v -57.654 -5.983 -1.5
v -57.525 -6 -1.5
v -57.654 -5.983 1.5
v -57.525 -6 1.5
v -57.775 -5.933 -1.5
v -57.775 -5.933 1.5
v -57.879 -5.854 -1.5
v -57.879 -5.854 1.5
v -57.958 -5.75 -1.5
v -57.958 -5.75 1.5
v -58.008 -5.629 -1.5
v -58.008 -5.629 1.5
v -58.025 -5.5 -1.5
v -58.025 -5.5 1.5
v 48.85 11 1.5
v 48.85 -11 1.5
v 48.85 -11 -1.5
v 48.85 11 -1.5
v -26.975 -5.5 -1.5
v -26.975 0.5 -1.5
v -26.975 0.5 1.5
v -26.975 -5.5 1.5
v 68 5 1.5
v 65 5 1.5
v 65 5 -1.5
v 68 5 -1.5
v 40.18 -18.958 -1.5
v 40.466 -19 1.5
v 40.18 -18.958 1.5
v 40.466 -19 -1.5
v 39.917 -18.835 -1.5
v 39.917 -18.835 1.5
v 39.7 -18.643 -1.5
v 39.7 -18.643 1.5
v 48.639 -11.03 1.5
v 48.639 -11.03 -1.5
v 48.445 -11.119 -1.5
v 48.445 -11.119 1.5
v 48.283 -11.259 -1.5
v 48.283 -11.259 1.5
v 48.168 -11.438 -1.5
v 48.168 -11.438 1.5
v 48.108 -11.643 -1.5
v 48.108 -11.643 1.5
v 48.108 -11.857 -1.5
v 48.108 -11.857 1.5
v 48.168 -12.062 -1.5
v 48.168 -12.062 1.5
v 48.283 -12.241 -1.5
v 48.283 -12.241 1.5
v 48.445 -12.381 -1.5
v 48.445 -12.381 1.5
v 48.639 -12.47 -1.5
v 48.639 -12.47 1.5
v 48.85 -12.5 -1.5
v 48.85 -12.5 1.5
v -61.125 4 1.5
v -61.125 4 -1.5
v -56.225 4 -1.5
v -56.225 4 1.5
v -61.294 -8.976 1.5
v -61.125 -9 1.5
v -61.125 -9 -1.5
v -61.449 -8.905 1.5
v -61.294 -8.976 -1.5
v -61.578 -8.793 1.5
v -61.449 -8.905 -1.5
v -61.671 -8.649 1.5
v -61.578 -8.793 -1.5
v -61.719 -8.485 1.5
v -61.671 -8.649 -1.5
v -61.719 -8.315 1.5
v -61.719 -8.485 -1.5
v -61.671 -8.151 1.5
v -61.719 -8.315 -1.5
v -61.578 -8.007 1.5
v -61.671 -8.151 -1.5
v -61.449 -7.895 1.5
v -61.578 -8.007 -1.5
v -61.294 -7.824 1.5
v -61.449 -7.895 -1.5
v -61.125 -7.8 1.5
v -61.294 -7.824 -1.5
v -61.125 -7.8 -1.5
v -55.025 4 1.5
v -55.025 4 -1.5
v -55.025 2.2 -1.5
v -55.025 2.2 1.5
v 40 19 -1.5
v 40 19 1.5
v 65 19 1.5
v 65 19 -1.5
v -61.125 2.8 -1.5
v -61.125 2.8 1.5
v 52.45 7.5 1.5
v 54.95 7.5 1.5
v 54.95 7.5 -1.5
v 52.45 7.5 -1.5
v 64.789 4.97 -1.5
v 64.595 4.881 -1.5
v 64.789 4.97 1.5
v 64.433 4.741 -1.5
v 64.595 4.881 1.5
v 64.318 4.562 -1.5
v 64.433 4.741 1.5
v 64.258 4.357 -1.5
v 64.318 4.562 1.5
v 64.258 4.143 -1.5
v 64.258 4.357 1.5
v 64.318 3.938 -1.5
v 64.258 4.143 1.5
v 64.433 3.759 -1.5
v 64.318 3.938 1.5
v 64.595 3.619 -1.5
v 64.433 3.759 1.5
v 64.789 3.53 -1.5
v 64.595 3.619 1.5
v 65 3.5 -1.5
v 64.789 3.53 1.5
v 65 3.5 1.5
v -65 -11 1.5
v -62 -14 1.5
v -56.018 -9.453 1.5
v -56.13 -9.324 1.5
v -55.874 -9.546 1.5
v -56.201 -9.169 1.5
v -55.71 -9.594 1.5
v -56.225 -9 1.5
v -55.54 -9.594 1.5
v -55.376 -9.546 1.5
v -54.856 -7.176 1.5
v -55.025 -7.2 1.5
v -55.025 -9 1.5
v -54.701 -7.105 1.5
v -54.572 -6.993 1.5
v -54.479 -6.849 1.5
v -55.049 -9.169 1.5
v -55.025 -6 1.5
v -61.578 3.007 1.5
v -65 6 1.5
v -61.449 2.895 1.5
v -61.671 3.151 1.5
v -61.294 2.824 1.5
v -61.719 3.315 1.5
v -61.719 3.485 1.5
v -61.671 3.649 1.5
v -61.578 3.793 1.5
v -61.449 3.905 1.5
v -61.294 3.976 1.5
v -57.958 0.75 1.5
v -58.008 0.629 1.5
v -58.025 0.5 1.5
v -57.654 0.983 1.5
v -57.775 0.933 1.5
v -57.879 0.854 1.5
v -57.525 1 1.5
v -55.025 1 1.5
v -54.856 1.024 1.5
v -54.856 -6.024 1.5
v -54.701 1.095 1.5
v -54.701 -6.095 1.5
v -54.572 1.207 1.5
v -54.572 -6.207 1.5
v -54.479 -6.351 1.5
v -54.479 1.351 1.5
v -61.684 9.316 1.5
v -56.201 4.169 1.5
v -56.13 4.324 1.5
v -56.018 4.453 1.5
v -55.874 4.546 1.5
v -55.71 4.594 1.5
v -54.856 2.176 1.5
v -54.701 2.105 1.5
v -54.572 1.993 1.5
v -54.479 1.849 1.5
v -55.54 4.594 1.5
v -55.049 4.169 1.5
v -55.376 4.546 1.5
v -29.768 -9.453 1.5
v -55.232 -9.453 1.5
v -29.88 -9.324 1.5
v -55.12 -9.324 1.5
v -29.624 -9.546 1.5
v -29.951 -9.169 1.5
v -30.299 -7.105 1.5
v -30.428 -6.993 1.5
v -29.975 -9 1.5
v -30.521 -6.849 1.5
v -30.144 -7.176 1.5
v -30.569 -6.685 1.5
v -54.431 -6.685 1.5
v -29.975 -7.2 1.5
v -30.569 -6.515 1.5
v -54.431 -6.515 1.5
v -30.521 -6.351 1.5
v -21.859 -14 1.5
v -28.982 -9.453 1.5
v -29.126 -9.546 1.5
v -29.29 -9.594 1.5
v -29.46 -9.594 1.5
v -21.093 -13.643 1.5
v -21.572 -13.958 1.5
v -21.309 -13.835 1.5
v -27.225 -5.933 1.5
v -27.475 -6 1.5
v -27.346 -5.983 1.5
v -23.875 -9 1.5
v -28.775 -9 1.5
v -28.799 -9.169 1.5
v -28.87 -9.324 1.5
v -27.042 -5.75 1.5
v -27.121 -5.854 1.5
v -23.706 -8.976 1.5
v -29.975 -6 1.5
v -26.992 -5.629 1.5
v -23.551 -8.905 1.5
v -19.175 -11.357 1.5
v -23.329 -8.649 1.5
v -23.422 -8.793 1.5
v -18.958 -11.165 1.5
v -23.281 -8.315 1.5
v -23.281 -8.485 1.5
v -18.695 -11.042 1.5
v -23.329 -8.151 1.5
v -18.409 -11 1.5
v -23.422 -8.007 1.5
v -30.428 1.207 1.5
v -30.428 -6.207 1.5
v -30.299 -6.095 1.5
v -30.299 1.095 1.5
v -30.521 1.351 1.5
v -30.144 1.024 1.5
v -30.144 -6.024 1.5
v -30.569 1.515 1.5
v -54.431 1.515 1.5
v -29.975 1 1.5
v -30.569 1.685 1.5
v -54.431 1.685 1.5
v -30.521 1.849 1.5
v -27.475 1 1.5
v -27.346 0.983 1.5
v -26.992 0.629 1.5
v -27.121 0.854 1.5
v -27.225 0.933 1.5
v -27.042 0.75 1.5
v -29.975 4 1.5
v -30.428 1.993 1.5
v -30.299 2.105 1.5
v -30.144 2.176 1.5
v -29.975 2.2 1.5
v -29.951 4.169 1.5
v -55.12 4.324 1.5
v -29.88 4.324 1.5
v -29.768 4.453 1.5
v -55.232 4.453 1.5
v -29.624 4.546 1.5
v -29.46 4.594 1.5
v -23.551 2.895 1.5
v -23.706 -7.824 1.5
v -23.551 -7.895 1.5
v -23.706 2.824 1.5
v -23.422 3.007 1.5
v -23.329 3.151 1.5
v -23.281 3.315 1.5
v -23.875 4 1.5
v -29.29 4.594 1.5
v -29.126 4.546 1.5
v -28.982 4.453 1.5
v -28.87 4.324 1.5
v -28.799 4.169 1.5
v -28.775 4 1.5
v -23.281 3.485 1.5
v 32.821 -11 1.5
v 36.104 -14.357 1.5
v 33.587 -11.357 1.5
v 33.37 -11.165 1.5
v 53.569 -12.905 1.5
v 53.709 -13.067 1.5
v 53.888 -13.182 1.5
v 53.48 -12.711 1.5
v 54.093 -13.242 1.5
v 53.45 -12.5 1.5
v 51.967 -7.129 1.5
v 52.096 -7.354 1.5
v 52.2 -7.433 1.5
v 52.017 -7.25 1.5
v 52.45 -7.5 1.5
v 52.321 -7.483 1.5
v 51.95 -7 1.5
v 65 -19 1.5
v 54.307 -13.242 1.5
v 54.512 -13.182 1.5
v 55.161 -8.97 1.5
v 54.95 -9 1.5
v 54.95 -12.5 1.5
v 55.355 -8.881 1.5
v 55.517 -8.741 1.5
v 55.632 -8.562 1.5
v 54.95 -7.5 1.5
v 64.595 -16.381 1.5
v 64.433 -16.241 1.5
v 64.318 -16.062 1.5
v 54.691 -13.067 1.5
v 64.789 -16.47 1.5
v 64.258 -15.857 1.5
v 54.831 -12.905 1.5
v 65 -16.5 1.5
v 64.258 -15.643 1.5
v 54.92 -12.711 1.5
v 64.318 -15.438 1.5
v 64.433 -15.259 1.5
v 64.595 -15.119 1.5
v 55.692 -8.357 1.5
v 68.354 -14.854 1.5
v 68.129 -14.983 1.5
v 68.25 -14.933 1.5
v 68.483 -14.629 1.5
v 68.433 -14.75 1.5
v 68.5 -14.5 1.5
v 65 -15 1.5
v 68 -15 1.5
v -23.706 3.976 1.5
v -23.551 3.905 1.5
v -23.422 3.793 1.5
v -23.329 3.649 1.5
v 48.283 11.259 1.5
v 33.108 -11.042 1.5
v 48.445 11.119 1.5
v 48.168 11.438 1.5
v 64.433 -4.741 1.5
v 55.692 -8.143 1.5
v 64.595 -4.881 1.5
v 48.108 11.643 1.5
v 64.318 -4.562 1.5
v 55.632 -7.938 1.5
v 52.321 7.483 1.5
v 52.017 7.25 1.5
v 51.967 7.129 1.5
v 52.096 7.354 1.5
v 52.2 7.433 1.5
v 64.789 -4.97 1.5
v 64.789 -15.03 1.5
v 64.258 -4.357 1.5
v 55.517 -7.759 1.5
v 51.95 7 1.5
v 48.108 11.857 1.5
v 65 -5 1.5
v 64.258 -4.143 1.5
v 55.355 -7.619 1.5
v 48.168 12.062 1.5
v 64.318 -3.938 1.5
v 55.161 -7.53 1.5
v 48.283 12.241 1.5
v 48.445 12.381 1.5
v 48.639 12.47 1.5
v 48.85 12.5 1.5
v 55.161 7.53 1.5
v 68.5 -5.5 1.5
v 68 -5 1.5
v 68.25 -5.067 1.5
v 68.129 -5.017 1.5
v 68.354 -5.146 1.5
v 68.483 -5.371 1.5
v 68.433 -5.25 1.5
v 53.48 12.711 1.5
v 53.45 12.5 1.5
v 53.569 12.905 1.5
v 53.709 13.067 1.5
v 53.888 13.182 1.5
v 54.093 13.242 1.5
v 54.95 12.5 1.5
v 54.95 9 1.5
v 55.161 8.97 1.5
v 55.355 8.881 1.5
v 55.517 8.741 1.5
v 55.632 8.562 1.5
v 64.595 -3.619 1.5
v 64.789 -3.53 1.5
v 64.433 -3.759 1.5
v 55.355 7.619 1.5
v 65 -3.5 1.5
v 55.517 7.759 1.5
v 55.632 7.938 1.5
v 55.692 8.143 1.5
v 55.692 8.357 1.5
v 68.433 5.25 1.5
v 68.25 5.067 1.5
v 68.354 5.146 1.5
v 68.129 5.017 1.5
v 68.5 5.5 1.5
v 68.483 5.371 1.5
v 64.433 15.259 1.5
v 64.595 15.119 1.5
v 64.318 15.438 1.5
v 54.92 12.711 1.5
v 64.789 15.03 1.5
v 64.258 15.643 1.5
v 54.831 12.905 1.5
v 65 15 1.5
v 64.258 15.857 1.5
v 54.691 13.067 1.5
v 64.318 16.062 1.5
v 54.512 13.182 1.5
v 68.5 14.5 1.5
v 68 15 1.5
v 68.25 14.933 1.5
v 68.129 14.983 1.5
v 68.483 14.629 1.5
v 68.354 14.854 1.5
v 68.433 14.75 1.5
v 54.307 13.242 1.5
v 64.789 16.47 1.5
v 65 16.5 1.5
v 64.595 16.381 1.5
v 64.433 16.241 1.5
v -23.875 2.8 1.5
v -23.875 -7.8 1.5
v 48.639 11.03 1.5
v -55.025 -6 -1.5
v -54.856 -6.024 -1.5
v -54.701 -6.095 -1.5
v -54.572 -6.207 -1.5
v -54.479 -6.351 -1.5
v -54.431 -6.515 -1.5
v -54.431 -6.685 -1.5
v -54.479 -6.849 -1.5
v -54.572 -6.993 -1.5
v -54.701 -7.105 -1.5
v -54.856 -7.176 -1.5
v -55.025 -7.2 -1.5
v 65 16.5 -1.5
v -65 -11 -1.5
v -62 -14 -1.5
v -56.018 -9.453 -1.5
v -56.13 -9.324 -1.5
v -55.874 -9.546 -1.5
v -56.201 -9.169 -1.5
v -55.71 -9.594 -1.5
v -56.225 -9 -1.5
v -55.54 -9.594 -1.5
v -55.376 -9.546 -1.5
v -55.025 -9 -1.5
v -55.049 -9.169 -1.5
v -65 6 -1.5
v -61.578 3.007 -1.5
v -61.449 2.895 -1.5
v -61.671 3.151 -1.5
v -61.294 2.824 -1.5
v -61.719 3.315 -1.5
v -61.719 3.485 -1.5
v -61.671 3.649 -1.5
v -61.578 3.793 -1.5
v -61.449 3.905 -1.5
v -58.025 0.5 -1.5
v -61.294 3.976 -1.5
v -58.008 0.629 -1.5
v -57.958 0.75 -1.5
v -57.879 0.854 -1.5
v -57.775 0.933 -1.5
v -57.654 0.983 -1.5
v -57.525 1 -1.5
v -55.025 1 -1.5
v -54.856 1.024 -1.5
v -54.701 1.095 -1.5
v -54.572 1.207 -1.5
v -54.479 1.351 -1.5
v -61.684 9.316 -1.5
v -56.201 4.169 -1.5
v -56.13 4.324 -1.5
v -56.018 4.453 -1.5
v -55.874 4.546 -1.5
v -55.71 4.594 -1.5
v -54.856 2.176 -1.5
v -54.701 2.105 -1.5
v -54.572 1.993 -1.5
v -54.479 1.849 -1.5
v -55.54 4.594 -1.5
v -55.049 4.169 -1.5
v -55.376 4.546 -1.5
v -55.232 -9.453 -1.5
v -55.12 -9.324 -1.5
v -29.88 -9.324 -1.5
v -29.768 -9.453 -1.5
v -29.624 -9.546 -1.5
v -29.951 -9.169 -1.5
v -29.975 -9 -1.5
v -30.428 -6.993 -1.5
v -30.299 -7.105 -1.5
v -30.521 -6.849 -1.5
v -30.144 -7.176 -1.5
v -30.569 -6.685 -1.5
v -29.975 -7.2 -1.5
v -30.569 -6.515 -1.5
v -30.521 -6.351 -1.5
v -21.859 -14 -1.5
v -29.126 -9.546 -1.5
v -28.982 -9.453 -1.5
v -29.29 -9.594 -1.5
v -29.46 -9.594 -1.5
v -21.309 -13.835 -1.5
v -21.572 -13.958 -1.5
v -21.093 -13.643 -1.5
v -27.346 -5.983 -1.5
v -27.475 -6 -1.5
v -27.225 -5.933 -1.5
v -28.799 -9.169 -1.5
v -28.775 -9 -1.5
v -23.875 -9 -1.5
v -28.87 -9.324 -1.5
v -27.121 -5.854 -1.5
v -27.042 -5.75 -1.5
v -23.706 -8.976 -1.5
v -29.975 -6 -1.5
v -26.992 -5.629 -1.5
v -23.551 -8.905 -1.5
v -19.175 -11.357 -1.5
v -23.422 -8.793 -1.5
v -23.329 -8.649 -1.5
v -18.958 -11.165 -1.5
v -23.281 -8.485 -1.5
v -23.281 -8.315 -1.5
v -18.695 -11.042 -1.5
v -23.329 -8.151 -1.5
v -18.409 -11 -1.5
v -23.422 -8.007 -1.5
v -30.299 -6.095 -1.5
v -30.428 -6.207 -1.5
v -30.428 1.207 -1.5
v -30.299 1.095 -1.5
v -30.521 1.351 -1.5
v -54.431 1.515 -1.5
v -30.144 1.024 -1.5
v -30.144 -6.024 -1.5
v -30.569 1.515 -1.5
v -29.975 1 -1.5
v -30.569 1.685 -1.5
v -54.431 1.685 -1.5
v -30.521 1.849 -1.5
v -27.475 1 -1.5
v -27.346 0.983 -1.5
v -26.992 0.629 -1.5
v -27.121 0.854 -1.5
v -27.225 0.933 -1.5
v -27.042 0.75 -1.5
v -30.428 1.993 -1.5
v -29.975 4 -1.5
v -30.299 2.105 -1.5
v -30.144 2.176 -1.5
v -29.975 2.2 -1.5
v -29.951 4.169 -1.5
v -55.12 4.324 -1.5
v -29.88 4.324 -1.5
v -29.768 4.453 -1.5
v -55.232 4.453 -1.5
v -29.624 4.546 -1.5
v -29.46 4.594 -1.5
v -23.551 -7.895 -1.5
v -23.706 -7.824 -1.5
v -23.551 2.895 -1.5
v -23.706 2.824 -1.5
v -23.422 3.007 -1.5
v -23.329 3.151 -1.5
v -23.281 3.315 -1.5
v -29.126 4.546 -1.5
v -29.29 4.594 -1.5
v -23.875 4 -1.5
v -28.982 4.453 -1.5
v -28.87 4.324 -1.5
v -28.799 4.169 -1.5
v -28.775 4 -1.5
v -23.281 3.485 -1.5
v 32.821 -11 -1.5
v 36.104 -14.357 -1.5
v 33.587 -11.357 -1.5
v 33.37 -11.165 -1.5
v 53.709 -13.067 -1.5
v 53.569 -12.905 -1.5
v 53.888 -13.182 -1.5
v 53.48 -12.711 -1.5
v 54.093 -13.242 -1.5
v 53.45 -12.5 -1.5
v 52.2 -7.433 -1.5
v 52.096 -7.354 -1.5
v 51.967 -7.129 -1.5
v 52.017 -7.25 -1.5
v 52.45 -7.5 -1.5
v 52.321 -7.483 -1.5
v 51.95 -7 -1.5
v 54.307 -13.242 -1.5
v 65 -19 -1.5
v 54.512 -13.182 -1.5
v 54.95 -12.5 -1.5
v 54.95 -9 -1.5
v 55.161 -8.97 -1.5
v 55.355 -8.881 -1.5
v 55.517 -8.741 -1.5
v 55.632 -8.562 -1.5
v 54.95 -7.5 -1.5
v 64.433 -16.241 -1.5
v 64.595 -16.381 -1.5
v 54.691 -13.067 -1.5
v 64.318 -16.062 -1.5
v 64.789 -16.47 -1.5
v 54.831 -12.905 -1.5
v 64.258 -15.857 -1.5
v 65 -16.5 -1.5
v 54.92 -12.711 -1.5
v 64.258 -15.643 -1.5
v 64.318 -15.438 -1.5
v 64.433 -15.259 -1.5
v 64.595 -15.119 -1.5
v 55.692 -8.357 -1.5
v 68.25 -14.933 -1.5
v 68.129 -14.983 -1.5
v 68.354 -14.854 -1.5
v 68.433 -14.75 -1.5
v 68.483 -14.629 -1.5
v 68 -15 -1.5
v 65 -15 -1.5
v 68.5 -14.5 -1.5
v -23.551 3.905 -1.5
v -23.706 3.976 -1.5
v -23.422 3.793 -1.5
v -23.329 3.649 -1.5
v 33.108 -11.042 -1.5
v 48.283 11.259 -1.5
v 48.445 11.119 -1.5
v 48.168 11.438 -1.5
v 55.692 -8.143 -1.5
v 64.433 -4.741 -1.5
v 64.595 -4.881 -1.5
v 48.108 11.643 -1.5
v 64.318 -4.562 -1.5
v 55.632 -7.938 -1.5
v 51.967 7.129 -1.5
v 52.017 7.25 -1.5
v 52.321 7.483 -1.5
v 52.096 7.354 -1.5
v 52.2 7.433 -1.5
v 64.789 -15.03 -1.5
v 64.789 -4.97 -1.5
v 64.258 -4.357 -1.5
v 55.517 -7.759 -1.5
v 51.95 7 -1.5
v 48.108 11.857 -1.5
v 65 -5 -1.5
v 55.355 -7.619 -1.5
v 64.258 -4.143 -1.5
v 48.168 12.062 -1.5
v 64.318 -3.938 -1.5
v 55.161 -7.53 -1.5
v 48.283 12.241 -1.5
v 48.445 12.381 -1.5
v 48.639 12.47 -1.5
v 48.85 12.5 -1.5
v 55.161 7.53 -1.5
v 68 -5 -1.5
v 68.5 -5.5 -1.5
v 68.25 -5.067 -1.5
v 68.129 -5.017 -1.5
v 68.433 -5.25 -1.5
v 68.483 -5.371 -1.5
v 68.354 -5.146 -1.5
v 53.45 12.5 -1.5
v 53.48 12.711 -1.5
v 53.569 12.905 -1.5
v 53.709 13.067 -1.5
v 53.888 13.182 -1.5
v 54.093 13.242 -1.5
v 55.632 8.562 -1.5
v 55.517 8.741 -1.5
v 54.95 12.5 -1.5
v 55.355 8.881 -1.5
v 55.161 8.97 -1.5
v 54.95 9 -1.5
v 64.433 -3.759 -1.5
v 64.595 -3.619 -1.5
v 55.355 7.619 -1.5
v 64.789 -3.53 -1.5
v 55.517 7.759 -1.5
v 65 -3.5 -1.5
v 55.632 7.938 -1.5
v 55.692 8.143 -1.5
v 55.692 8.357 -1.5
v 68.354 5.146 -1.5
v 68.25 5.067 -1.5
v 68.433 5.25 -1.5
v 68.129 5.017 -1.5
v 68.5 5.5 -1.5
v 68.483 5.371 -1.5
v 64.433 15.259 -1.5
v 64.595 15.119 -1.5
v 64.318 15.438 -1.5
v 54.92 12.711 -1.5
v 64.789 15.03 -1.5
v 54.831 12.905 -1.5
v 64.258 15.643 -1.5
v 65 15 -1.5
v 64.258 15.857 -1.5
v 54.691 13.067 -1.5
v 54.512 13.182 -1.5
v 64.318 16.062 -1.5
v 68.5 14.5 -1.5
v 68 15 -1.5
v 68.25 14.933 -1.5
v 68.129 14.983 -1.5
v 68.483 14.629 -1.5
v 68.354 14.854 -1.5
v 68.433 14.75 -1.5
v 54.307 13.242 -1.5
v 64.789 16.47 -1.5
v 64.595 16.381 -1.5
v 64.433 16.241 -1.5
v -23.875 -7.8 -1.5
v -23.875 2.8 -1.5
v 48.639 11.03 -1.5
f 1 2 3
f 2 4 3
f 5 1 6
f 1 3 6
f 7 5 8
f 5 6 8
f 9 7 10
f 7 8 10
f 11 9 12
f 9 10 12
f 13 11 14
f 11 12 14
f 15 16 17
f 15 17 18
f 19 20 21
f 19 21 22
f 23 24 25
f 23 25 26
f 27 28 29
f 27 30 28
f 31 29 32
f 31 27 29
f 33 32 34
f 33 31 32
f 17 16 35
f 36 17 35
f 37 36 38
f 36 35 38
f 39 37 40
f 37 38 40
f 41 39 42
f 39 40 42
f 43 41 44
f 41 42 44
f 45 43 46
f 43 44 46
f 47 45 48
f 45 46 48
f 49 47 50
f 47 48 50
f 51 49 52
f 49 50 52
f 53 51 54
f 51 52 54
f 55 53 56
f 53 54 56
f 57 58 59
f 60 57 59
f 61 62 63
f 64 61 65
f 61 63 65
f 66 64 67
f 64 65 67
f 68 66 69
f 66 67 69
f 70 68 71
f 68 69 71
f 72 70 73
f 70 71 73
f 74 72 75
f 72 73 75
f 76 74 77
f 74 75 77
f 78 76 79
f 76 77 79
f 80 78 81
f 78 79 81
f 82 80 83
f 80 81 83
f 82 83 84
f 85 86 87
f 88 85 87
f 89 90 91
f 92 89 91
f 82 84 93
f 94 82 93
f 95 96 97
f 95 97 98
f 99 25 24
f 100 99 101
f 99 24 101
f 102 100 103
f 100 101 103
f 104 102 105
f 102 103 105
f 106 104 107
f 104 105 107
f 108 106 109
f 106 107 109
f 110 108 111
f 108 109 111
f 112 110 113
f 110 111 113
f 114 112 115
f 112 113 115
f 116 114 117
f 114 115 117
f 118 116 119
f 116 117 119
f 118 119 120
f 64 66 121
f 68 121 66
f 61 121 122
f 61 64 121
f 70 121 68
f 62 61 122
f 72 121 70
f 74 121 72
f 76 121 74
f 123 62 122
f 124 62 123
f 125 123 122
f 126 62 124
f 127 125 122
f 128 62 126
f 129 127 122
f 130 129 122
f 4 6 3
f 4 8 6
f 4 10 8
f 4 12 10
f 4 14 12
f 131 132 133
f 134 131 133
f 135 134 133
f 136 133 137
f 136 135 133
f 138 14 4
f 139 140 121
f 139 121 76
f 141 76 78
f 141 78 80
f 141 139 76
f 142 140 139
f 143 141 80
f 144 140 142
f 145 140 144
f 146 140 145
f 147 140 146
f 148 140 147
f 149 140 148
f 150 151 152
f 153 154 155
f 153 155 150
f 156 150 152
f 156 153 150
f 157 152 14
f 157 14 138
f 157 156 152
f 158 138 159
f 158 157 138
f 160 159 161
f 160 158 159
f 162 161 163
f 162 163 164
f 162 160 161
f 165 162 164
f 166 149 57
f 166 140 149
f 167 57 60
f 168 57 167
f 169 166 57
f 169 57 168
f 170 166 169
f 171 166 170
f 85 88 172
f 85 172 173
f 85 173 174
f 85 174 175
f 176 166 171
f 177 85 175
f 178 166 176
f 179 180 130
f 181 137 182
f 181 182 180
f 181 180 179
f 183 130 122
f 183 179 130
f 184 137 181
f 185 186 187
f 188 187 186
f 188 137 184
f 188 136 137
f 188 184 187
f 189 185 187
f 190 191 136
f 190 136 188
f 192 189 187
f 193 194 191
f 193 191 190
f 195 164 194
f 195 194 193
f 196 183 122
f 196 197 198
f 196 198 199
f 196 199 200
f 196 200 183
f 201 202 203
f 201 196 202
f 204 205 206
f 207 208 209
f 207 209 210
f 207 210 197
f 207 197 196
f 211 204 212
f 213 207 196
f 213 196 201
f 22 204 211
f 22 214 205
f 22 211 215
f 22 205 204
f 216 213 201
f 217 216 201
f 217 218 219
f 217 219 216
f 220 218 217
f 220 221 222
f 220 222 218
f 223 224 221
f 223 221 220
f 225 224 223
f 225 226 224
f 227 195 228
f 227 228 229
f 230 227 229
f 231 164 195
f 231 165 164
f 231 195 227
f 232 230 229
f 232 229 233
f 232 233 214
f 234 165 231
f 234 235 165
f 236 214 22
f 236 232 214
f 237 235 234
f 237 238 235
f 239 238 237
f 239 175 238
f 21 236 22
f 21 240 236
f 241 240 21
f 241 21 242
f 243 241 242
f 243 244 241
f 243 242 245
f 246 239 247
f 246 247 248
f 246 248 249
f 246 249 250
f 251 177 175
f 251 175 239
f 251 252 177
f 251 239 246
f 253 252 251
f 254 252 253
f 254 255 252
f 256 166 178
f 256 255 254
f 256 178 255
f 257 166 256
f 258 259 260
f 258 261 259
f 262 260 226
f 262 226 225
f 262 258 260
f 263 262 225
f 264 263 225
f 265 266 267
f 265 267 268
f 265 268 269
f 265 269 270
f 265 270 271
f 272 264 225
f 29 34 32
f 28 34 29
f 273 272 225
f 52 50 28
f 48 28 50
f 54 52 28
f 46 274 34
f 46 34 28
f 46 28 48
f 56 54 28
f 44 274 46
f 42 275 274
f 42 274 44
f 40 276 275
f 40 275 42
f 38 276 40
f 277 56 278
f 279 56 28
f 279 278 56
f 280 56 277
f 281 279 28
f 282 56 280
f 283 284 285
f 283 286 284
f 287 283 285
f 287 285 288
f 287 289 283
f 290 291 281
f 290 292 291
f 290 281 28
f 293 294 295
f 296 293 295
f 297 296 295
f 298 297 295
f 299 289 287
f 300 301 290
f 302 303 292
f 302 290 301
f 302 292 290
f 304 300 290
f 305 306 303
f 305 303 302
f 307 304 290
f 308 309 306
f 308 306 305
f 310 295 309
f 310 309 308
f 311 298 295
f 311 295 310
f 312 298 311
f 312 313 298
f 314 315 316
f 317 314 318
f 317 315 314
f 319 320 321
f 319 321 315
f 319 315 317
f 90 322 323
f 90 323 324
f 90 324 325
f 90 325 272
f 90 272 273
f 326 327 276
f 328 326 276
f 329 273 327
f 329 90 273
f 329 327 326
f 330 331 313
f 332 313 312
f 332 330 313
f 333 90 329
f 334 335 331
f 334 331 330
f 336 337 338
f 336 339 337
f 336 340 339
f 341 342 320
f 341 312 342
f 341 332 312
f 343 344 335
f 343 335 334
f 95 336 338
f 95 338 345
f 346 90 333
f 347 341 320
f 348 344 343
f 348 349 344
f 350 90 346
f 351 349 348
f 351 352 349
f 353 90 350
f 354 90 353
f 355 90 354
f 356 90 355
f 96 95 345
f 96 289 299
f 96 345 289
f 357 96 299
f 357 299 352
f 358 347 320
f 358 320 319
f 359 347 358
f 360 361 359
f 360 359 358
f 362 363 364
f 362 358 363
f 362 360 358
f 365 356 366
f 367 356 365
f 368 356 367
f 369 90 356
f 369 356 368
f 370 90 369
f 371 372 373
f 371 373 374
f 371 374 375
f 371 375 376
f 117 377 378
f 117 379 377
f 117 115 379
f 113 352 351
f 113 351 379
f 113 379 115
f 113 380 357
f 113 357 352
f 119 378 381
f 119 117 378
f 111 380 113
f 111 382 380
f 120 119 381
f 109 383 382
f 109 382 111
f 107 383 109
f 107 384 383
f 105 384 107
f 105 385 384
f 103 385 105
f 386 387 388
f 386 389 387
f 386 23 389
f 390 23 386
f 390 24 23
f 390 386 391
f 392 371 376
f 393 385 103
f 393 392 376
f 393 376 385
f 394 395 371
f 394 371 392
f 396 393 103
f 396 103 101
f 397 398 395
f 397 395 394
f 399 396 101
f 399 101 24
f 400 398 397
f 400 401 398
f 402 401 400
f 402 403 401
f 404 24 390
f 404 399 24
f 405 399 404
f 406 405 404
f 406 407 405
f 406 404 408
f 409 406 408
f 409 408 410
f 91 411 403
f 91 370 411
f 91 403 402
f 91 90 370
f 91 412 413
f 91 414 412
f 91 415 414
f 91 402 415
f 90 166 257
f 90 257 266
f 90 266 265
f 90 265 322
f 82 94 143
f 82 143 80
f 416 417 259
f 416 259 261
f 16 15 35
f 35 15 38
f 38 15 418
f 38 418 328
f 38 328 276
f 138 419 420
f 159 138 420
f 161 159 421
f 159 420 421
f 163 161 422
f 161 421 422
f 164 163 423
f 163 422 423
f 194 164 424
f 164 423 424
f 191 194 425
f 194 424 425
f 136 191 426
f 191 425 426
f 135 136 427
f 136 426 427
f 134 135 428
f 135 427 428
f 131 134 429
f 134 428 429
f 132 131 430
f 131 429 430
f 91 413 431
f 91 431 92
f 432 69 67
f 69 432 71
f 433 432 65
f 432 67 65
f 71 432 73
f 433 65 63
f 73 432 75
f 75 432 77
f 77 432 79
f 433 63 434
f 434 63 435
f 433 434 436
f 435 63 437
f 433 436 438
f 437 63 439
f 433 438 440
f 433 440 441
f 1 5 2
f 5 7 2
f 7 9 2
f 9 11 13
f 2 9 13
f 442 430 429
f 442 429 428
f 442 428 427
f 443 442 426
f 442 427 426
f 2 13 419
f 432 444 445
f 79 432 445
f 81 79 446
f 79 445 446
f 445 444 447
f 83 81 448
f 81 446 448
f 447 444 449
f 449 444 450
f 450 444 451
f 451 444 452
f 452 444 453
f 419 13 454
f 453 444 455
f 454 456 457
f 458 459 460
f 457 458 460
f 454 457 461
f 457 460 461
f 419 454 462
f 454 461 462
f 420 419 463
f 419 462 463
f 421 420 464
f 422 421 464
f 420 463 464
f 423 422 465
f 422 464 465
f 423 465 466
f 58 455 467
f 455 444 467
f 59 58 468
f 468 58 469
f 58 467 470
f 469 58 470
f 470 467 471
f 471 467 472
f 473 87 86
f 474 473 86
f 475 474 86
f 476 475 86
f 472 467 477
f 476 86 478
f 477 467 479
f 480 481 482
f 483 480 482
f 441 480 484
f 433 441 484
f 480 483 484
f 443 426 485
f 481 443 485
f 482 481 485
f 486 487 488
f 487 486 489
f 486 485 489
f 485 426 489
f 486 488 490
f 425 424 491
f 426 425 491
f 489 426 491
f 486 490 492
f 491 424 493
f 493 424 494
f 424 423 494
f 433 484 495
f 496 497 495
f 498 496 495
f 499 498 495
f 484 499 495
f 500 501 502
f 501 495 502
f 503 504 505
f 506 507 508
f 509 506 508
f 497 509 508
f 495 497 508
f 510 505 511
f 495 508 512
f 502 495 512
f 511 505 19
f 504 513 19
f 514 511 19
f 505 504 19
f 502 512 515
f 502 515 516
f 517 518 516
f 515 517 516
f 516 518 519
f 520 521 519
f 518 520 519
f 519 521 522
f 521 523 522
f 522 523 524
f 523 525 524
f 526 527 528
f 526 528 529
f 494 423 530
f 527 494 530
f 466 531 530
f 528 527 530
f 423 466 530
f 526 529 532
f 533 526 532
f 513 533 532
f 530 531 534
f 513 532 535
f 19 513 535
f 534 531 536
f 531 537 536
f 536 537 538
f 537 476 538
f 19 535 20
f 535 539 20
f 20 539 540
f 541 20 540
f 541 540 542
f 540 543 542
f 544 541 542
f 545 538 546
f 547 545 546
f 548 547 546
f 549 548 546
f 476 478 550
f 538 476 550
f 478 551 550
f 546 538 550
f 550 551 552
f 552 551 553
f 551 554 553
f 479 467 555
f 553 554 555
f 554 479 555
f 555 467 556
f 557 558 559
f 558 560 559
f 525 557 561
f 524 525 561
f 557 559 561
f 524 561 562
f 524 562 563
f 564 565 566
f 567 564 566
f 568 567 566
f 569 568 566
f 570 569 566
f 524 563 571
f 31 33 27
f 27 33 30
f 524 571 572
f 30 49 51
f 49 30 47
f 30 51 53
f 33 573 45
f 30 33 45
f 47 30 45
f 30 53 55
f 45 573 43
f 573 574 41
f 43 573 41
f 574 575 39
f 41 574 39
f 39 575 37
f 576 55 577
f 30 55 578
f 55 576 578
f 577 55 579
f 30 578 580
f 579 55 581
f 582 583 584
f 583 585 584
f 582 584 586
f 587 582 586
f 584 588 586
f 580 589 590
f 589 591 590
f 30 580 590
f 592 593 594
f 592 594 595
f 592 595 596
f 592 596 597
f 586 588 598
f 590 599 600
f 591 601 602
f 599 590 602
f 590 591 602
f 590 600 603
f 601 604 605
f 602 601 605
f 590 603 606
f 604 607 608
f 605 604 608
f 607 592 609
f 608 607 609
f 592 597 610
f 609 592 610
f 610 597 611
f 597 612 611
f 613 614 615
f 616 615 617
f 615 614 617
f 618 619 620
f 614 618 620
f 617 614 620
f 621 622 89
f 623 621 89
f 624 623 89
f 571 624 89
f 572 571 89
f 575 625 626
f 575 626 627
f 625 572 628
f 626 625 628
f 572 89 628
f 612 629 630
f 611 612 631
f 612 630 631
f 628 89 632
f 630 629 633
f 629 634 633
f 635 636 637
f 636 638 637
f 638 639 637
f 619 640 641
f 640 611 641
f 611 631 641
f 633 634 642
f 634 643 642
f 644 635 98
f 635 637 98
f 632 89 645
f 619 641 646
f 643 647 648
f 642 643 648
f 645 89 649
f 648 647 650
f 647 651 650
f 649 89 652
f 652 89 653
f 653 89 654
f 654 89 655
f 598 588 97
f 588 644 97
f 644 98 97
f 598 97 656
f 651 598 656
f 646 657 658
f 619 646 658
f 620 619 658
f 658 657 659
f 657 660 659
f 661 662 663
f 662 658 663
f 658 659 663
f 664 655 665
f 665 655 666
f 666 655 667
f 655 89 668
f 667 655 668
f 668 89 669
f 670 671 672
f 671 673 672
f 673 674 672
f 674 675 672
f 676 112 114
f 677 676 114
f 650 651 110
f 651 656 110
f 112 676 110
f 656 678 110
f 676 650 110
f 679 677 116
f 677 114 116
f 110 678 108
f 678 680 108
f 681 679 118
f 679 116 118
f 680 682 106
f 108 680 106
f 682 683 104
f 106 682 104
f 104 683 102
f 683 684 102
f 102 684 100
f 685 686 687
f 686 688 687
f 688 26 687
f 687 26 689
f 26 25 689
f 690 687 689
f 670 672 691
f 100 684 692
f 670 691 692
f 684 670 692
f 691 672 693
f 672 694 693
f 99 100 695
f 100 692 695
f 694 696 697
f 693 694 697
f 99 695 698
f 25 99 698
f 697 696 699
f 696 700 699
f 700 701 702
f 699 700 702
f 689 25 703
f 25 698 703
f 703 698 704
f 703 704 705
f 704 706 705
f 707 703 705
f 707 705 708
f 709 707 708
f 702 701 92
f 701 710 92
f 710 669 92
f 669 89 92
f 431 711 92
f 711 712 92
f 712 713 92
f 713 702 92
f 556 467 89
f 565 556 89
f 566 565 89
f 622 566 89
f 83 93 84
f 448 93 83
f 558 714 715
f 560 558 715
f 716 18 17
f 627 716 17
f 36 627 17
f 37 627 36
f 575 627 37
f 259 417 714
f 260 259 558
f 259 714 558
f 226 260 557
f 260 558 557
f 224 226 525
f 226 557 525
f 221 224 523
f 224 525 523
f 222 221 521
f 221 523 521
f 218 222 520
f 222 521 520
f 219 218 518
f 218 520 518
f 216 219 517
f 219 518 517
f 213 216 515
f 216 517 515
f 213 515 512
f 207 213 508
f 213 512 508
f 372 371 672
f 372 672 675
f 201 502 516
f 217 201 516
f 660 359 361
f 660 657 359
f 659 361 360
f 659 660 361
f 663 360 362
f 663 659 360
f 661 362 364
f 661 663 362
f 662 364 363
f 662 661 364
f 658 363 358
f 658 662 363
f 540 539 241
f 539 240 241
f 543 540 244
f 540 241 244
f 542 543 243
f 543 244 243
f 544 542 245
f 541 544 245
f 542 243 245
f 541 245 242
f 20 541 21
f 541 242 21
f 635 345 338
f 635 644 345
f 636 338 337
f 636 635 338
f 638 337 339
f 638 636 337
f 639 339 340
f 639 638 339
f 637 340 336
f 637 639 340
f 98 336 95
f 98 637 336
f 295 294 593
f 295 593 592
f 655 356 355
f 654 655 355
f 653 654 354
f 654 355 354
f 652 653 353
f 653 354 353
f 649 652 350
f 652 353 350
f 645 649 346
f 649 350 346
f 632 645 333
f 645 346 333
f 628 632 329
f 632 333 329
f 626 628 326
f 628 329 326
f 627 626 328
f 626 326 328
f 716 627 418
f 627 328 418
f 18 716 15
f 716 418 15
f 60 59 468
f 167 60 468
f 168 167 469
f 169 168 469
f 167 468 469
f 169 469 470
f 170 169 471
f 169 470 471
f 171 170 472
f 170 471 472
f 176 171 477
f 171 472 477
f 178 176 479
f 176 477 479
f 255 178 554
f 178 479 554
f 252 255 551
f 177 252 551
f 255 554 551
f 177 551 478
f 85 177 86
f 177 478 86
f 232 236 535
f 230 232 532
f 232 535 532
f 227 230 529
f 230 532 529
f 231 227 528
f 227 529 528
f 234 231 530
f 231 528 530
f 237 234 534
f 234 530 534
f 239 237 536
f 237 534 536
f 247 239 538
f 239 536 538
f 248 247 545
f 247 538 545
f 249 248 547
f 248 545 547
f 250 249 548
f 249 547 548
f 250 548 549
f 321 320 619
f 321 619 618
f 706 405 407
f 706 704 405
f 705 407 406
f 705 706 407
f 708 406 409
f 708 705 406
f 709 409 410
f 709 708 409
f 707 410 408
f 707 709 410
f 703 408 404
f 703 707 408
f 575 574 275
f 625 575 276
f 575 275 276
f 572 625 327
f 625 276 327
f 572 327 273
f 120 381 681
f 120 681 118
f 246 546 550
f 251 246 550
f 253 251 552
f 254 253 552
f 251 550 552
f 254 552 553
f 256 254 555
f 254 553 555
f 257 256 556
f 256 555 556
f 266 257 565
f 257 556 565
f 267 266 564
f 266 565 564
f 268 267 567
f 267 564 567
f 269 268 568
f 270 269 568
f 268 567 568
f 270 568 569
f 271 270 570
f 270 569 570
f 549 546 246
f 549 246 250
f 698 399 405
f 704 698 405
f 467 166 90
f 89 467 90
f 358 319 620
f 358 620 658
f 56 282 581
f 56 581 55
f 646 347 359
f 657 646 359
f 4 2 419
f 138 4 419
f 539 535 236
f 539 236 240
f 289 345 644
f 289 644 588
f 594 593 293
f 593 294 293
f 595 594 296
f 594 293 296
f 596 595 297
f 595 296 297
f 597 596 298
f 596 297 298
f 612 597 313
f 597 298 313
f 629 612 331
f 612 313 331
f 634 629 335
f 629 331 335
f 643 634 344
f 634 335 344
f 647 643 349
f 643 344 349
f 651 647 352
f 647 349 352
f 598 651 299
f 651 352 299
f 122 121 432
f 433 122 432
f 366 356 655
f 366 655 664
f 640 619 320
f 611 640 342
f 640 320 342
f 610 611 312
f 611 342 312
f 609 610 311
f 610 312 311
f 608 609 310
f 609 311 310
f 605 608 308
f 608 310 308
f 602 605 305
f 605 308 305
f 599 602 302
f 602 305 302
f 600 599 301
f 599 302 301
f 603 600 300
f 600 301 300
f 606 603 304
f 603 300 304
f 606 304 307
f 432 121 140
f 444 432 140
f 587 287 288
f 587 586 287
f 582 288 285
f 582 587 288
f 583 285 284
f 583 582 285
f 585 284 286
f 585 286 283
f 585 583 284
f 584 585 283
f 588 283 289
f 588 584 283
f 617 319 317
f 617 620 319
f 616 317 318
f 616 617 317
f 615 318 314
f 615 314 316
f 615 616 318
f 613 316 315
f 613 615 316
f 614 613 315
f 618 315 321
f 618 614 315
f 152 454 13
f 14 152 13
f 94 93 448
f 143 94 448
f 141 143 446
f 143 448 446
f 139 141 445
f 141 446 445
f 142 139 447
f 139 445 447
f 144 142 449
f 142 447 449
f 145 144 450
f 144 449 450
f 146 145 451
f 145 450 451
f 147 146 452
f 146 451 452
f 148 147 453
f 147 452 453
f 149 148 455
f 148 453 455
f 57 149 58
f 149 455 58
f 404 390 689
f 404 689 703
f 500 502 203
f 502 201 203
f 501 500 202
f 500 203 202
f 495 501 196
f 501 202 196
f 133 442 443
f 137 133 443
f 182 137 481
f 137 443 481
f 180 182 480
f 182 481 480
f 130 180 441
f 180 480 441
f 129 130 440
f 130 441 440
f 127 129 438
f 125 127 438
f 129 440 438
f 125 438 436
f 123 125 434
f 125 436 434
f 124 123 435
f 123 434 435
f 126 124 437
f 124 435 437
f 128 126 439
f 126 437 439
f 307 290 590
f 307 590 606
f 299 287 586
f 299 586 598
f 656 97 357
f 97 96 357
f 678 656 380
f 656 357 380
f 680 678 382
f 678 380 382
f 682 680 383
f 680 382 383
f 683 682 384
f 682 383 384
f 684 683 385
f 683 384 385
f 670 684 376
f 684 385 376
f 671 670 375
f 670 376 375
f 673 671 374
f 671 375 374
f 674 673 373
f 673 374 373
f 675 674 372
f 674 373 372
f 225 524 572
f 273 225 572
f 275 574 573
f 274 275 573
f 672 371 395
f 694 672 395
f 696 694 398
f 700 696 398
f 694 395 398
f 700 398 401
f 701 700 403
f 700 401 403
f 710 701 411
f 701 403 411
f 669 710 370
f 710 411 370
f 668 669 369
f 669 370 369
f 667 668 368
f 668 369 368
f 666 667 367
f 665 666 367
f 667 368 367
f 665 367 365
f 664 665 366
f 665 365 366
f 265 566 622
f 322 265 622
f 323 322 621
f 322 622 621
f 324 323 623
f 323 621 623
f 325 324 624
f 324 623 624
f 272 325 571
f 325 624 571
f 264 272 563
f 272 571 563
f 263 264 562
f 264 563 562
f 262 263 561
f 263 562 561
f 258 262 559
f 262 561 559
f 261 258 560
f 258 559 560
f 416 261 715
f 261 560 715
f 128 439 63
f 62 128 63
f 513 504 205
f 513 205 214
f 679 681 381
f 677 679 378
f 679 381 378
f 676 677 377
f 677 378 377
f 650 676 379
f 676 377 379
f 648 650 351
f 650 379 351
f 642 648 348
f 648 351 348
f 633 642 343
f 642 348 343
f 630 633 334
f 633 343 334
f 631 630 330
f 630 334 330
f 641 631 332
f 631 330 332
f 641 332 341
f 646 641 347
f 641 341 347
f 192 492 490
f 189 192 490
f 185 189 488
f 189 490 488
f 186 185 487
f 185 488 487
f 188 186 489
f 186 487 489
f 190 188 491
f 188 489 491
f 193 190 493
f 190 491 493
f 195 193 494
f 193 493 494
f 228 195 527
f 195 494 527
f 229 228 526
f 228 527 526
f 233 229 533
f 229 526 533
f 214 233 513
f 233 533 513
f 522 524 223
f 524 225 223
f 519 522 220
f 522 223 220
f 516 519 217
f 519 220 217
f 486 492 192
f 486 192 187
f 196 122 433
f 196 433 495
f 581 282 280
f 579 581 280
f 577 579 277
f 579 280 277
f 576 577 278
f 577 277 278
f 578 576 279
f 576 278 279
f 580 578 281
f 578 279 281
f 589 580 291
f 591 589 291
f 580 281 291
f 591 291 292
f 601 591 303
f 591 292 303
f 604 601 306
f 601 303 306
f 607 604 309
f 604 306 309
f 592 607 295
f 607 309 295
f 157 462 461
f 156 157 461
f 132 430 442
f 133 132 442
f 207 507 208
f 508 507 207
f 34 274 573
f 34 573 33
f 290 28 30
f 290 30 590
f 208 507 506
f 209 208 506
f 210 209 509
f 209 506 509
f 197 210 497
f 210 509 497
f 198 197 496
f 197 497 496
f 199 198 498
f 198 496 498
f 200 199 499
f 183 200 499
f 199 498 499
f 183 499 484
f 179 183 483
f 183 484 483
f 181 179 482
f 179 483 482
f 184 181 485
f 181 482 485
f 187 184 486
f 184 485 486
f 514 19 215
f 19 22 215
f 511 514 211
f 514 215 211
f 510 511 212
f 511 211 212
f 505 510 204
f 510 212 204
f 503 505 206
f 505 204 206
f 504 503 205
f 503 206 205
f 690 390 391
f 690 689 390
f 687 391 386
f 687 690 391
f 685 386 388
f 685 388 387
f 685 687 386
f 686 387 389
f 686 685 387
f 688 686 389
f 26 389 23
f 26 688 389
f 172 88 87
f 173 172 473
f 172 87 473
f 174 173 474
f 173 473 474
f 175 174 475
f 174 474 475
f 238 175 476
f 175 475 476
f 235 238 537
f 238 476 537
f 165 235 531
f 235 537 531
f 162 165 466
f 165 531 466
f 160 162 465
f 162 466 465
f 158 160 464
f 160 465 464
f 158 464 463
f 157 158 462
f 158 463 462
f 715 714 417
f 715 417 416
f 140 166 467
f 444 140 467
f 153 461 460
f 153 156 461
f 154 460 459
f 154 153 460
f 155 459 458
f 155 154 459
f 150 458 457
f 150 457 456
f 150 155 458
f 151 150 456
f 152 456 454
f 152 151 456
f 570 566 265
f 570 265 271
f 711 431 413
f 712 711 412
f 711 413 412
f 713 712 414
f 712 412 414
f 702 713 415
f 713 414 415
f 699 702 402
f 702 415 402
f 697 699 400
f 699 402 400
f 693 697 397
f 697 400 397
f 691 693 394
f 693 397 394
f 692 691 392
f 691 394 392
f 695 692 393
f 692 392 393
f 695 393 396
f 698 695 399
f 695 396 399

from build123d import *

# Parameters (mm, degrees)
SKETCH_1_W             = 130
SKETCH_1_H             = 38
EXTRUDE_1_DEPTH        = 1.5
SKETCH_2_W             = 3.5
SKETCH_2_H             = 10
EXTRUDE_2_DEPTH        = 3
CUT_EXTRUDE_2_DEPTH    = 4
SKETCH_3_R             = 0.75
CUT_EXTRUDE_1_DEPTH    = 4
FILLET_1_R             = 0.5
CUT_EXTRUDE_3_DEPTH    = 4
FILLET_2_R             = 1
CUT_EXTRUDE_4_DEPTH    = 4
CUT_EXTRUDE_6_DEPTH    = 4
SKETCH_9_R             = 0.6
CUT_EXTRUDE_7_DEPTH    = 4
FILLET_3_R             = 0.5
CUT_EXTRUDE_8_DEPTH    = 4
FILLET_4_R             = 1
CHAMFER_1_SIZE         = 3
CHAMFER_1_EDGE_2_SIZE2 = 3.330793123
CHAMFER_1_EDGE_2_SIZE  = 3


with BuildPart() as part:
    # 草图1 → 凸台-拉伸1 (new body, symmetric)
    with BuildSketch(Plane.XY):
        Rectangle(SKETCH_1_W, SKETCH_1_H)
    extrude(amount=EXTRUDE_1_DEPTH, both=True)

    # 草图2 → 凸台-拉伸2 (add)
    with BuildSketch(Plane.XY.offset(1.5)):
        with Locations((66.75, 10)):
            Rectangle(SKETCH_2_W, SKETCH_2_H)
        with Locations((66.75, -10)):
            Rectangle(SKETCH_2_W, SKETCH_2_H)
    extrude(amount=-EXTRUDE_2_DEPTH)

    # 草图4 → 切除-拉伸2 (cut, through all)
    with BuildSketch(Plane.XY.offset(1.5)):
        Polygon((48.85, 12.5), (54.95, 12.5), (54.95, 7.5), (51.95, 7.5), (51.95, -7.5), (54.95, -7.5), (54.95, -12.5), (48.85, -12.5), align=None)
    extrude(amount=-CUT_EXTRUDE_2_DEPTH, mode=Mode.SUBTRACT)

    # 草图3 → 切除-拉伸1 (cut, through all)
    with BuildSketch(Plane.XY.offset(1.5)):
        with Locations((65, 15.75)):
            Circle(SKETCH_3_R)
        with Locations((65, 4.25)):
            Circle(SKETCH_3_R)
        with Locations((65, -4.25)):
            Circle(SKETCH_3_R)
        with Locations((65, -15.75)):
            Circle(SKETCH_3_R)
        with Locations((54.95, 8.25)):
            Circle(SKETCH_3_R)
        with Locations((54.2, 12.5)):
            Circle(SKETCH_3_R)
        with Locations((48.85, 11.75)):
            Circle(SKETCH_3_R)
        with Locations((48.85, -11.75)):
            Circle(SKETCH_3_R)
        with Locations((54.95, -8.25)):
            Circle(SKETCH_3_R)
        with Locations((54.2, -12.5)):
            Circle(SKETCH_3_R)
    extrude(amount=-CUT_EXTRUDE_1_DEPTH, mode=Mode.SUBTRACT)

    # 圆角1
    fillet_1_edges = [part.edges().sort_by_distance(p)[0] for p in [
        (68.5, 15, 0),
        (68.5, 5, 0),
        (68.5, -5, 0),
        (68.5, -15, 0),
        (51.95, 7.5, 0),
        (51.95, -7.5, 0),
    ]]
    fillet(fillet_1_edges, radius=FILLET_1_R)

    # 草图5 → 切除-拉伸3 (cut, through all)
    with BuildSketch(Plane.XY.offset(1.5)):
        Polygon((-65, -19), (-65, -14), (35.804501844, -14), (40, -19), align=None)
    extrude(amount=-CUT_EXTRUDE_3_DEPTH, mode=Mode.SUBTRACT)

    # 圆角2
    fillet_2_edges = [part.edges().sort_by_distance(p)[0] for p in [
        (40, -19, 0),
        (35.804501844, -14, 0),
    ]]
    fillet(fillet_2_edges, radius=FILLET_2_R)

    # 草图6 → 切除-拉伸4 (cut, through all)
    with BuildSketch(Plane.XY.offset(1.5)):
        Polygon((-65, 9), (40, 19), (-65, 19), align=None)
    extrude(amount=-CUT_EXTRUDE_4_DEPTH, mode=Mode.SUBTRACT)

    # 草图8 → 切除-拉伸6 (cut, through all)
    with BuildSketch(Plane(origin=(0, 0, -1.5), x_dir=(-1, 0, 0), z_dir=(0, 0, -1))):
        Polygon((29.975, -6), (29.975, -9), (23.875, -9), (23.875, 4), (29.975, 4), (29.975, 1), (26.975, 1), (26.975, -6), align=None)
        Polygon((58.025, 1), (58.025, -6), (55.025, -6), (55.025, -9), (61.125, -9), (61.125, 4), (55.025, 4), (55.025, 1), align=None)
    extrude(amount=-CUT_EXTRUDE_6_DEPTH, mode=Mode.SUBTRACT)

    # 草图9 → 切除-拉伸7 (cut, through all)
    with BuildSketch(Plane(origin=(0, 0, -1.5), x_dir=(-1, 0, 0), z_dir=(0, 0, -1))):
        with Locations((29.975, 1.6)):
            Circle(SKETCH_9_R)
        with Locations((29.975, -6.6)):
            Circle(SKETCH_9_R)
        with Locations((29.375, -9)):
            Circle(SKETCH_9_R)
        with Locations((29.375, 4)):
            Circle(SKETCH_9_R)
        with Locations((23.875, 3.4)):
            Circle(SKETCH_9_R)
        with Locations((23.875, -8.4)):
            Circle(SKETCH_9_R)
        with Locations((55.025, -6.6)):
            Circle(SKETCH_9_R)
        with Locations((55.625, -9)):
            Circle(SKETCH_9_R)
        with Locations((55.025, 1.6)):
            Circle(SKETCH_9_R)
        with Locations((55.625, 4)):
            Circle(SKETCH_9_R)
        with Locations((61.125, 3.4)):
            Circle(SKETCH_9_R)
        with Locations((61.125, -8.4)):
            Circle(SKETCH_9_R)
    extrude(amount=-CUT_EXTRUDE_7_DEPTH, mode=Mode.SUBTRACT)

    # 圆角3
    fillet_3_edges = [part.edges().sort_by_distance(p)[0] for p in [
        (-26.975, -6, 0),
        (-26.975, 1, 0),
        (-58.025, 1, 0),
        (-58.025, -6, 0),
    ]]
    fillet(fillet_3_edges, radius=FILLET_3_R)

    # 草图11 → 切除-拉伸8 (cut, through all)
    with BuildSketch(Plane(origin=(0, 0, -1.5), x_dir=(-1, 0, 0), z_dir=(0, 0, -1))):
        with BuildLine():
            Line((21.392298894, -14), (18.875, -11))
            Line((18.875, -11), (-33.287202951, -11))
            Line((-33.287202951, -11), (-36.104238629, -14.35721239))
            ThreePointArc((-36.104238629, -14.35721239), (-35.760812448, -14.093692213), (-35.338194186, -14))
            Line((-35.338194186, -14), (21.392298894, -14))
        make_face()
    extrude(amount=-CUT_EXTRUDE_8_DEPTH, mode=Mode.SUBTRACT)

    # 圆角4
    fillet_4_edges = [part.edges().sort_by_distance(p)[0] for p in [
        (-21.392298894, -14, 0),
        (33.287202951, -11, 0),
        (-18.875, -11, 0),
    ]]
    fillet(fillet_4_edges, radius=FILLET_4_R)

    # 倒角1
    chamfer_1_edges = [part.edges().sort_by_distance(p)[0] for p in [
        (-65, -14, 0),
    ]]
    chamfer(chamfer_1_edges, length=CHAMFER_1_SIZE)

    # 倒角1 edge 2
    chamfer_1_edge_2_edges = [part.edges().sort_by_distance(p)[0] for p in [
        (-65, 9, 0),
    ]]
    chamfer(chamfer_1_edge_2_edges, length=CHAMFER_1_EDGE_2_SIZE, length2=CHAMFER_1_EDGE_2_SIZE2)


solid = part.part
